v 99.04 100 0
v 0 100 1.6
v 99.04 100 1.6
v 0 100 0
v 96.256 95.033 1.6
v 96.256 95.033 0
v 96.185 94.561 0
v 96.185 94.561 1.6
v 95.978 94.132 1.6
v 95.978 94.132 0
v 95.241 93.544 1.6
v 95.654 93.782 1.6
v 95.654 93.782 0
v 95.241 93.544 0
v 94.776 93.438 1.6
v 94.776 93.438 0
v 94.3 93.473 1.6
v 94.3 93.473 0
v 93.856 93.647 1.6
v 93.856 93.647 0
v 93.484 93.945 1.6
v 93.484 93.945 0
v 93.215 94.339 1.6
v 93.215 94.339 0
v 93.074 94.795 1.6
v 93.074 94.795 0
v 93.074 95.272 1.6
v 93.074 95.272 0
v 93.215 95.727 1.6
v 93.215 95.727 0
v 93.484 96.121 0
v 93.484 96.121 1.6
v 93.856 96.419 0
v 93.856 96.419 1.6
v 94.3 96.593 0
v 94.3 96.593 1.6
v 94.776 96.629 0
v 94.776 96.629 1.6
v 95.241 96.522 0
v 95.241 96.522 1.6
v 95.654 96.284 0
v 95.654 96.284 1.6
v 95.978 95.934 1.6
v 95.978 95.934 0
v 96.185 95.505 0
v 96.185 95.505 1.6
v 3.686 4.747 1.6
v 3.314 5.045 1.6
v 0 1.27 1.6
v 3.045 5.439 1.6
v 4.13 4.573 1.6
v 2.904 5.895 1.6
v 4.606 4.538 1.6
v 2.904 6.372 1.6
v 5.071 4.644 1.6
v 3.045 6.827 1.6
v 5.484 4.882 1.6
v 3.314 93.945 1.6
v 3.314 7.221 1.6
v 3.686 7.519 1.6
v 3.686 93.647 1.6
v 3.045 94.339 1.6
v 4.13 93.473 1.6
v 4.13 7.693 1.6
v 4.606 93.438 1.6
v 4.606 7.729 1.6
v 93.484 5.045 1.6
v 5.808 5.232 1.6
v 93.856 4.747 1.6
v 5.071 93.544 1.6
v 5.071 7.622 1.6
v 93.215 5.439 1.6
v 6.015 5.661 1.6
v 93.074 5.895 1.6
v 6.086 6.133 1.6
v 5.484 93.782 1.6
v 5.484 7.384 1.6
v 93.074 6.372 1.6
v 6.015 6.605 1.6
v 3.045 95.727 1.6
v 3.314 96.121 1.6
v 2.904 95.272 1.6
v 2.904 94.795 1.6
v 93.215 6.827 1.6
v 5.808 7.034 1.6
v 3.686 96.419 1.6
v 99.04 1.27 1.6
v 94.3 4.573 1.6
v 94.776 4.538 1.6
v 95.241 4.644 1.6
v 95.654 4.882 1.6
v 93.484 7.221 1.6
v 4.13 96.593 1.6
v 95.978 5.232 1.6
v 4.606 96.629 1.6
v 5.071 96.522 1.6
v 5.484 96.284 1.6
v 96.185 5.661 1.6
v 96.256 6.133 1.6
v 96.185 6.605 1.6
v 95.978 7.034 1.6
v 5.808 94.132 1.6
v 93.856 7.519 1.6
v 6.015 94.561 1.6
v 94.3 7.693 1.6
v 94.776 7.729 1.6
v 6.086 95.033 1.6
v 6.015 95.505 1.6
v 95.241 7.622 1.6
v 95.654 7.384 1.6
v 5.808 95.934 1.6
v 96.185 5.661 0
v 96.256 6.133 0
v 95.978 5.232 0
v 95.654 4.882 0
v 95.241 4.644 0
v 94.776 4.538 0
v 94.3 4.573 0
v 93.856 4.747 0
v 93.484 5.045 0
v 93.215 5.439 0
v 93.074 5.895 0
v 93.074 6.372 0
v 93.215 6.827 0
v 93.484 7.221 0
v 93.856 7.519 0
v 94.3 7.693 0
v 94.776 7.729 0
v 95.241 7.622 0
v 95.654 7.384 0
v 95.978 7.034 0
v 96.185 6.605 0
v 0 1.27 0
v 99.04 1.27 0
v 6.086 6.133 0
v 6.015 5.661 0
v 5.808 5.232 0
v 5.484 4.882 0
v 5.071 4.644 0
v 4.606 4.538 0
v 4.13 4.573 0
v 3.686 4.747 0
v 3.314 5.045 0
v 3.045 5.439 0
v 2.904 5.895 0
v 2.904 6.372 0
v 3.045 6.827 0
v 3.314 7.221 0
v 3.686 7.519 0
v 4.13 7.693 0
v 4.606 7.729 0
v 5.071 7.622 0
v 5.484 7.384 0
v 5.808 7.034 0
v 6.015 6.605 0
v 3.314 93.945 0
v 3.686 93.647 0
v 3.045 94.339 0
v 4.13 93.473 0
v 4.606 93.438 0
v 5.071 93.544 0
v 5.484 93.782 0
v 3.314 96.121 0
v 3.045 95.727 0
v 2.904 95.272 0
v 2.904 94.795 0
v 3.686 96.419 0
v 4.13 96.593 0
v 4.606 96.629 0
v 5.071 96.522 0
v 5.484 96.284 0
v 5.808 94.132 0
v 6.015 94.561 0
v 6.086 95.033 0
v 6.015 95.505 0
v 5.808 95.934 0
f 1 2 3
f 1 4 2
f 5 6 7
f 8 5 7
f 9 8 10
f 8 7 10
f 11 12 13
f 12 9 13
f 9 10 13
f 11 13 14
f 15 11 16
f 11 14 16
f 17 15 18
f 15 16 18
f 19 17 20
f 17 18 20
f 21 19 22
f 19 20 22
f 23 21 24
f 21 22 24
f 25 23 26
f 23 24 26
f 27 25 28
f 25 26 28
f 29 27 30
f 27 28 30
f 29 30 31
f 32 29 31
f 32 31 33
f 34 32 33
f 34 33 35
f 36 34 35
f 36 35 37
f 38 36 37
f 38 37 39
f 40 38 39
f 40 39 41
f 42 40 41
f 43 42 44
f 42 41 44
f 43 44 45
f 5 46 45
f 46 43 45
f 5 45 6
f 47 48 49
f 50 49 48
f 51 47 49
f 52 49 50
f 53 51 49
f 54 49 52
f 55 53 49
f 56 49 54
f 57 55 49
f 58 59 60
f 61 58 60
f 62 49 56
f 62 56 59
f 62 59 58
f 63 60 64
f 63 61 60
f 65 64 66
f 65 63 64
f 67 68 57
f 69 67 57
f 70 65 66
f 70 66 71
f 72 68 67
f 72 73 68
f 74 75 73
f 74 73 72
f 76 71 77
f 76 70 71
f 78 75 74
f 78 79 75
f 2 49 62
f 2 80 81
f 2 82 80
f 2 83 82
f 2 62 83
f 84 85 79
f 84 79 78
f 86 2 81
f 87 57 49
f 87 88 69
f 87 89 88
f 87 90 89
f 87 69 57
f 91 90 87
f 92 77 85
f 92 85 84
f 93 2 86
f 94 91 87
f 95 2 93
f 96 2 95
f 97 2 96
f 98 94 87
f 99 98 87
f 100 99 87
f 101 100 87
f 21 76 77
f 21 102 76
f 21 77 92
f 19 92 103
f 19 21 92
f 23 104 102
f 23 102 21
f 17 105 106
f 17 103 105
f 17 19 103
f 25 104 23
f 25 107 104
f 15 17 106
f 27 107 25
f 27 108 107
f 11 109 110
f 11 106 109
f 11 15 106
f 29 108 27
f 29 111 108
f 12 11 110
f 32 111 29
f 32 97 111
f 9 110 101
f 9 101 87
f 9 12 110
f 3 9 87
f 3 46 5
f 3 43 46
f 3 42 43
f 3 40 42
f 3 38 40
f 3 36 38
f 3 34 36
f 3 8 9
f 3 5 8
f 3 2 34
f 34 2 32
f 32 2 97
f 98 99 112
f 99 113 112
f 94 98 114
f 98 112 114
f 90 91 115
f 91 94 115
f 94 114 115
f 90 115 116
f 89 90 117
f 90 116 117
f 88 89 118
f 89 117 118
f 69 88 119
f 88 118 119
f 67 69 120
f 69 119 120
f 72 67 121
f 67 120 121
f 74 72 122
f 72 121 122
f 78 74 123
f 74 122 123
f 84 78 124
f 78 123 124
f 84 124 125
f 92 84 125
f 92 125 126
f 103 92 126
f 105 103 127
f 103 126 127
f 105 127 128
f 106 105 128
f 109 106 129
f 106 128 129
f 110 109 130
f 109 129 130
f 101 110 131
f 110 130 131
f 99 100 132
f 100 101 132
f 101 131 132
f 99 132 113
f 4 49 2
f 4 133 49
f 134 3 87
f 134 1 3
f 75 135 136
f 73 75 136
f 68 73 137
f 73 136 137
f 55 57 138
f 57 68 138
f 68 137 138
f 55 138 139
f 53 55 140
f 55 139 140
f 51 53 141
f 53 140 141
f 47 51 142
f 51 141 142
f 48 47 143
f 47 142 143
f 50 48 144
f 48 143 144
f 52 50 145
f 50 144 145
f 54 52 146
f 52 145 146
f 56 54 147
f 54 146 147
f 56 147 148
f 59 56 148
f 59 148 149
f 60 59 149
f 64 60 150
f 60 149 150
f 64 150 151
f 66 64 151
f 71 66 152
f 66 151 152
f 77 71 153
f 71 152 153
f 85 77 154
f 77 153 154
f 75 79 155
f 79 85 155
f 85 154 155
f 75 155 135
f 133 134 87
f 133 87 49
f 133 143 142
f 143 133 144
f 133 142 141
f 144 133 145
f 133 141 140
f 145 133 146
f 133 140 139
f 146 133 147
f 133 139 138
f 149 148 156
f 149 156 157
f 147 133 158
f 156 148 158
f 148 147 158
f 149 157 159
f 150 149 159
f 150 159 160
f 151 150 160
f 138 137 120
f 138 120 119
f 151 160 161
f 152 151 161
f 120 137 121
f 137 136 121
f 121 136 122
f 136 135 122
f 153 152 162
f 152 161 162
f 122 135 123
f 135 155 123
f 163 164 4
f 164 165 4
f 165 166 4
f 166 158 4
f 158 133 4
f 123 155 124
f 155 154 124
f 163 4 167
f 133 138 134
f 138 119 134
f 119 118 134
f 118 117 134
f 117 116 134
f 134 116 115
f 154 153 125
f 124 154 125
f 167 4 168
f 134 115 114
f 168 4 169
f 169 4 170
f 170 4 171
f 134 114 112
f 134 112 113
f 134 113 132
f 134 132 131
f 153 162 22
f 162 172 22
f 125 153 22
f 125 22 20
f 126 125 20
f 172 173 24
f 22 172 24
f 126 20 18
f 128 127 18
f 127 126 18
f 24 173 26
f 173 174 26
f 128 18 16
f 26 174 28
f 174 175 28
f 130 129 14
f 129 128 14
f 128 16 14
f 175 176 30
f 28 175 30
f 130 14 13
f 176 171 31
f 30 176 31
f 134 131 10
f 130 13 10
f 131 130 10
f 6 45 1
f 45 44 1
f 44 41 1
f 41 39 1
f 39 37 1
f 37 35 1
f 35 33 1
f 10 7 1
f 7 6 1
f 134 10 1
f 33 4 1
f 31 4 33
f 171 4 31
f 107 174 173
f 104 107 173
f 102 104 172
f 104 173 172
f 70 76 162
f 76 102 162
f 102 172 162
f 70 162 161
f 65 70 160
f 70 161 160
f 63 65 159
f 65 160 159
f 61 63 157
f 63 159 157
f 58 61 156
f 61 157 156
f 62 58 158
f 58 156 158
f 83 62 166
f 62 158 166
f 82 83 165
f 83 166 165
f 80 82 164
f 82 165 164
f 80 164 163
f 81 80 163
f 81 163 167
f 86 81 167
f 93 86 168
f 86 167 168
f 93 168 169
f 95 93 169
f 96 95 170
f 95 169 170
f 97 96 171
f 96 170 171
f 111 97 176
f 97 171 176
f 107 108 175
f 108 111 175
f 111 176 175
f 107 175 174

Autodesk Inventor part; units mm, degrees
ref_plane "YZ Plane" through (0, 0, 0) normal (1, 0, 0) x (0, 1, 0)
ref_plane "XZ Plane" through (0, 0, 0) normal (0, 1, 0) x (-1, 0, 0)
ref_plane "XY Plane" through (0, 0, 0) normal (0, 0, 1) x (1, 0, 0)
sketch "スケッチ1" plane through (0, 0, 0) normal (0, 0, 1) x (1, 0, 0)
  line L0 (0, 100) -> (99.04, 100)
  line L1 (99.04, 100) -> (99.04, 1.27)
  line L2 (99.04, 1.27) -> (0, 1.27)
  line L3 (0, 1.27) -> (0, 100)
  circle A0 centre (94.6564, 95.0331) radius 1.6
  circle A1 centre (94.6564, 6.1331) radius 1.6
  circle A2 centre (4.4864, 6.1331) radius 1.6
  circle A3 centre (4.4864, 95.0331) radius 1.6
  point P0 (0, 0)
  dimension "d2" = 3.2
  dimension "d3" = 3.2
  dimension "d4" = 3.2
  dimension "d5" = 3.2
extrude "押し出し2" add sketch "スケッチ1" along normal blind 1.6
sketch "スケッチ2" plane through (0, 0, 1.6) normal (0, 0, 1) x (1, 0, 0)
  line L0 (43.0744, 59.3857) -> (45.1715, 59.3857) construction
  line L1 (45.1715, 59.3857) -> (45.1715, 55.7795) construction
  line L2 (45.1715, 55.7795) -> (43.0744, 55.7795) construction
  line L3 (43.0744, 55.7795) -> (43.0744, 59.3857) construction
  point P0 (0, 0)
properties part number "メイン基板"
